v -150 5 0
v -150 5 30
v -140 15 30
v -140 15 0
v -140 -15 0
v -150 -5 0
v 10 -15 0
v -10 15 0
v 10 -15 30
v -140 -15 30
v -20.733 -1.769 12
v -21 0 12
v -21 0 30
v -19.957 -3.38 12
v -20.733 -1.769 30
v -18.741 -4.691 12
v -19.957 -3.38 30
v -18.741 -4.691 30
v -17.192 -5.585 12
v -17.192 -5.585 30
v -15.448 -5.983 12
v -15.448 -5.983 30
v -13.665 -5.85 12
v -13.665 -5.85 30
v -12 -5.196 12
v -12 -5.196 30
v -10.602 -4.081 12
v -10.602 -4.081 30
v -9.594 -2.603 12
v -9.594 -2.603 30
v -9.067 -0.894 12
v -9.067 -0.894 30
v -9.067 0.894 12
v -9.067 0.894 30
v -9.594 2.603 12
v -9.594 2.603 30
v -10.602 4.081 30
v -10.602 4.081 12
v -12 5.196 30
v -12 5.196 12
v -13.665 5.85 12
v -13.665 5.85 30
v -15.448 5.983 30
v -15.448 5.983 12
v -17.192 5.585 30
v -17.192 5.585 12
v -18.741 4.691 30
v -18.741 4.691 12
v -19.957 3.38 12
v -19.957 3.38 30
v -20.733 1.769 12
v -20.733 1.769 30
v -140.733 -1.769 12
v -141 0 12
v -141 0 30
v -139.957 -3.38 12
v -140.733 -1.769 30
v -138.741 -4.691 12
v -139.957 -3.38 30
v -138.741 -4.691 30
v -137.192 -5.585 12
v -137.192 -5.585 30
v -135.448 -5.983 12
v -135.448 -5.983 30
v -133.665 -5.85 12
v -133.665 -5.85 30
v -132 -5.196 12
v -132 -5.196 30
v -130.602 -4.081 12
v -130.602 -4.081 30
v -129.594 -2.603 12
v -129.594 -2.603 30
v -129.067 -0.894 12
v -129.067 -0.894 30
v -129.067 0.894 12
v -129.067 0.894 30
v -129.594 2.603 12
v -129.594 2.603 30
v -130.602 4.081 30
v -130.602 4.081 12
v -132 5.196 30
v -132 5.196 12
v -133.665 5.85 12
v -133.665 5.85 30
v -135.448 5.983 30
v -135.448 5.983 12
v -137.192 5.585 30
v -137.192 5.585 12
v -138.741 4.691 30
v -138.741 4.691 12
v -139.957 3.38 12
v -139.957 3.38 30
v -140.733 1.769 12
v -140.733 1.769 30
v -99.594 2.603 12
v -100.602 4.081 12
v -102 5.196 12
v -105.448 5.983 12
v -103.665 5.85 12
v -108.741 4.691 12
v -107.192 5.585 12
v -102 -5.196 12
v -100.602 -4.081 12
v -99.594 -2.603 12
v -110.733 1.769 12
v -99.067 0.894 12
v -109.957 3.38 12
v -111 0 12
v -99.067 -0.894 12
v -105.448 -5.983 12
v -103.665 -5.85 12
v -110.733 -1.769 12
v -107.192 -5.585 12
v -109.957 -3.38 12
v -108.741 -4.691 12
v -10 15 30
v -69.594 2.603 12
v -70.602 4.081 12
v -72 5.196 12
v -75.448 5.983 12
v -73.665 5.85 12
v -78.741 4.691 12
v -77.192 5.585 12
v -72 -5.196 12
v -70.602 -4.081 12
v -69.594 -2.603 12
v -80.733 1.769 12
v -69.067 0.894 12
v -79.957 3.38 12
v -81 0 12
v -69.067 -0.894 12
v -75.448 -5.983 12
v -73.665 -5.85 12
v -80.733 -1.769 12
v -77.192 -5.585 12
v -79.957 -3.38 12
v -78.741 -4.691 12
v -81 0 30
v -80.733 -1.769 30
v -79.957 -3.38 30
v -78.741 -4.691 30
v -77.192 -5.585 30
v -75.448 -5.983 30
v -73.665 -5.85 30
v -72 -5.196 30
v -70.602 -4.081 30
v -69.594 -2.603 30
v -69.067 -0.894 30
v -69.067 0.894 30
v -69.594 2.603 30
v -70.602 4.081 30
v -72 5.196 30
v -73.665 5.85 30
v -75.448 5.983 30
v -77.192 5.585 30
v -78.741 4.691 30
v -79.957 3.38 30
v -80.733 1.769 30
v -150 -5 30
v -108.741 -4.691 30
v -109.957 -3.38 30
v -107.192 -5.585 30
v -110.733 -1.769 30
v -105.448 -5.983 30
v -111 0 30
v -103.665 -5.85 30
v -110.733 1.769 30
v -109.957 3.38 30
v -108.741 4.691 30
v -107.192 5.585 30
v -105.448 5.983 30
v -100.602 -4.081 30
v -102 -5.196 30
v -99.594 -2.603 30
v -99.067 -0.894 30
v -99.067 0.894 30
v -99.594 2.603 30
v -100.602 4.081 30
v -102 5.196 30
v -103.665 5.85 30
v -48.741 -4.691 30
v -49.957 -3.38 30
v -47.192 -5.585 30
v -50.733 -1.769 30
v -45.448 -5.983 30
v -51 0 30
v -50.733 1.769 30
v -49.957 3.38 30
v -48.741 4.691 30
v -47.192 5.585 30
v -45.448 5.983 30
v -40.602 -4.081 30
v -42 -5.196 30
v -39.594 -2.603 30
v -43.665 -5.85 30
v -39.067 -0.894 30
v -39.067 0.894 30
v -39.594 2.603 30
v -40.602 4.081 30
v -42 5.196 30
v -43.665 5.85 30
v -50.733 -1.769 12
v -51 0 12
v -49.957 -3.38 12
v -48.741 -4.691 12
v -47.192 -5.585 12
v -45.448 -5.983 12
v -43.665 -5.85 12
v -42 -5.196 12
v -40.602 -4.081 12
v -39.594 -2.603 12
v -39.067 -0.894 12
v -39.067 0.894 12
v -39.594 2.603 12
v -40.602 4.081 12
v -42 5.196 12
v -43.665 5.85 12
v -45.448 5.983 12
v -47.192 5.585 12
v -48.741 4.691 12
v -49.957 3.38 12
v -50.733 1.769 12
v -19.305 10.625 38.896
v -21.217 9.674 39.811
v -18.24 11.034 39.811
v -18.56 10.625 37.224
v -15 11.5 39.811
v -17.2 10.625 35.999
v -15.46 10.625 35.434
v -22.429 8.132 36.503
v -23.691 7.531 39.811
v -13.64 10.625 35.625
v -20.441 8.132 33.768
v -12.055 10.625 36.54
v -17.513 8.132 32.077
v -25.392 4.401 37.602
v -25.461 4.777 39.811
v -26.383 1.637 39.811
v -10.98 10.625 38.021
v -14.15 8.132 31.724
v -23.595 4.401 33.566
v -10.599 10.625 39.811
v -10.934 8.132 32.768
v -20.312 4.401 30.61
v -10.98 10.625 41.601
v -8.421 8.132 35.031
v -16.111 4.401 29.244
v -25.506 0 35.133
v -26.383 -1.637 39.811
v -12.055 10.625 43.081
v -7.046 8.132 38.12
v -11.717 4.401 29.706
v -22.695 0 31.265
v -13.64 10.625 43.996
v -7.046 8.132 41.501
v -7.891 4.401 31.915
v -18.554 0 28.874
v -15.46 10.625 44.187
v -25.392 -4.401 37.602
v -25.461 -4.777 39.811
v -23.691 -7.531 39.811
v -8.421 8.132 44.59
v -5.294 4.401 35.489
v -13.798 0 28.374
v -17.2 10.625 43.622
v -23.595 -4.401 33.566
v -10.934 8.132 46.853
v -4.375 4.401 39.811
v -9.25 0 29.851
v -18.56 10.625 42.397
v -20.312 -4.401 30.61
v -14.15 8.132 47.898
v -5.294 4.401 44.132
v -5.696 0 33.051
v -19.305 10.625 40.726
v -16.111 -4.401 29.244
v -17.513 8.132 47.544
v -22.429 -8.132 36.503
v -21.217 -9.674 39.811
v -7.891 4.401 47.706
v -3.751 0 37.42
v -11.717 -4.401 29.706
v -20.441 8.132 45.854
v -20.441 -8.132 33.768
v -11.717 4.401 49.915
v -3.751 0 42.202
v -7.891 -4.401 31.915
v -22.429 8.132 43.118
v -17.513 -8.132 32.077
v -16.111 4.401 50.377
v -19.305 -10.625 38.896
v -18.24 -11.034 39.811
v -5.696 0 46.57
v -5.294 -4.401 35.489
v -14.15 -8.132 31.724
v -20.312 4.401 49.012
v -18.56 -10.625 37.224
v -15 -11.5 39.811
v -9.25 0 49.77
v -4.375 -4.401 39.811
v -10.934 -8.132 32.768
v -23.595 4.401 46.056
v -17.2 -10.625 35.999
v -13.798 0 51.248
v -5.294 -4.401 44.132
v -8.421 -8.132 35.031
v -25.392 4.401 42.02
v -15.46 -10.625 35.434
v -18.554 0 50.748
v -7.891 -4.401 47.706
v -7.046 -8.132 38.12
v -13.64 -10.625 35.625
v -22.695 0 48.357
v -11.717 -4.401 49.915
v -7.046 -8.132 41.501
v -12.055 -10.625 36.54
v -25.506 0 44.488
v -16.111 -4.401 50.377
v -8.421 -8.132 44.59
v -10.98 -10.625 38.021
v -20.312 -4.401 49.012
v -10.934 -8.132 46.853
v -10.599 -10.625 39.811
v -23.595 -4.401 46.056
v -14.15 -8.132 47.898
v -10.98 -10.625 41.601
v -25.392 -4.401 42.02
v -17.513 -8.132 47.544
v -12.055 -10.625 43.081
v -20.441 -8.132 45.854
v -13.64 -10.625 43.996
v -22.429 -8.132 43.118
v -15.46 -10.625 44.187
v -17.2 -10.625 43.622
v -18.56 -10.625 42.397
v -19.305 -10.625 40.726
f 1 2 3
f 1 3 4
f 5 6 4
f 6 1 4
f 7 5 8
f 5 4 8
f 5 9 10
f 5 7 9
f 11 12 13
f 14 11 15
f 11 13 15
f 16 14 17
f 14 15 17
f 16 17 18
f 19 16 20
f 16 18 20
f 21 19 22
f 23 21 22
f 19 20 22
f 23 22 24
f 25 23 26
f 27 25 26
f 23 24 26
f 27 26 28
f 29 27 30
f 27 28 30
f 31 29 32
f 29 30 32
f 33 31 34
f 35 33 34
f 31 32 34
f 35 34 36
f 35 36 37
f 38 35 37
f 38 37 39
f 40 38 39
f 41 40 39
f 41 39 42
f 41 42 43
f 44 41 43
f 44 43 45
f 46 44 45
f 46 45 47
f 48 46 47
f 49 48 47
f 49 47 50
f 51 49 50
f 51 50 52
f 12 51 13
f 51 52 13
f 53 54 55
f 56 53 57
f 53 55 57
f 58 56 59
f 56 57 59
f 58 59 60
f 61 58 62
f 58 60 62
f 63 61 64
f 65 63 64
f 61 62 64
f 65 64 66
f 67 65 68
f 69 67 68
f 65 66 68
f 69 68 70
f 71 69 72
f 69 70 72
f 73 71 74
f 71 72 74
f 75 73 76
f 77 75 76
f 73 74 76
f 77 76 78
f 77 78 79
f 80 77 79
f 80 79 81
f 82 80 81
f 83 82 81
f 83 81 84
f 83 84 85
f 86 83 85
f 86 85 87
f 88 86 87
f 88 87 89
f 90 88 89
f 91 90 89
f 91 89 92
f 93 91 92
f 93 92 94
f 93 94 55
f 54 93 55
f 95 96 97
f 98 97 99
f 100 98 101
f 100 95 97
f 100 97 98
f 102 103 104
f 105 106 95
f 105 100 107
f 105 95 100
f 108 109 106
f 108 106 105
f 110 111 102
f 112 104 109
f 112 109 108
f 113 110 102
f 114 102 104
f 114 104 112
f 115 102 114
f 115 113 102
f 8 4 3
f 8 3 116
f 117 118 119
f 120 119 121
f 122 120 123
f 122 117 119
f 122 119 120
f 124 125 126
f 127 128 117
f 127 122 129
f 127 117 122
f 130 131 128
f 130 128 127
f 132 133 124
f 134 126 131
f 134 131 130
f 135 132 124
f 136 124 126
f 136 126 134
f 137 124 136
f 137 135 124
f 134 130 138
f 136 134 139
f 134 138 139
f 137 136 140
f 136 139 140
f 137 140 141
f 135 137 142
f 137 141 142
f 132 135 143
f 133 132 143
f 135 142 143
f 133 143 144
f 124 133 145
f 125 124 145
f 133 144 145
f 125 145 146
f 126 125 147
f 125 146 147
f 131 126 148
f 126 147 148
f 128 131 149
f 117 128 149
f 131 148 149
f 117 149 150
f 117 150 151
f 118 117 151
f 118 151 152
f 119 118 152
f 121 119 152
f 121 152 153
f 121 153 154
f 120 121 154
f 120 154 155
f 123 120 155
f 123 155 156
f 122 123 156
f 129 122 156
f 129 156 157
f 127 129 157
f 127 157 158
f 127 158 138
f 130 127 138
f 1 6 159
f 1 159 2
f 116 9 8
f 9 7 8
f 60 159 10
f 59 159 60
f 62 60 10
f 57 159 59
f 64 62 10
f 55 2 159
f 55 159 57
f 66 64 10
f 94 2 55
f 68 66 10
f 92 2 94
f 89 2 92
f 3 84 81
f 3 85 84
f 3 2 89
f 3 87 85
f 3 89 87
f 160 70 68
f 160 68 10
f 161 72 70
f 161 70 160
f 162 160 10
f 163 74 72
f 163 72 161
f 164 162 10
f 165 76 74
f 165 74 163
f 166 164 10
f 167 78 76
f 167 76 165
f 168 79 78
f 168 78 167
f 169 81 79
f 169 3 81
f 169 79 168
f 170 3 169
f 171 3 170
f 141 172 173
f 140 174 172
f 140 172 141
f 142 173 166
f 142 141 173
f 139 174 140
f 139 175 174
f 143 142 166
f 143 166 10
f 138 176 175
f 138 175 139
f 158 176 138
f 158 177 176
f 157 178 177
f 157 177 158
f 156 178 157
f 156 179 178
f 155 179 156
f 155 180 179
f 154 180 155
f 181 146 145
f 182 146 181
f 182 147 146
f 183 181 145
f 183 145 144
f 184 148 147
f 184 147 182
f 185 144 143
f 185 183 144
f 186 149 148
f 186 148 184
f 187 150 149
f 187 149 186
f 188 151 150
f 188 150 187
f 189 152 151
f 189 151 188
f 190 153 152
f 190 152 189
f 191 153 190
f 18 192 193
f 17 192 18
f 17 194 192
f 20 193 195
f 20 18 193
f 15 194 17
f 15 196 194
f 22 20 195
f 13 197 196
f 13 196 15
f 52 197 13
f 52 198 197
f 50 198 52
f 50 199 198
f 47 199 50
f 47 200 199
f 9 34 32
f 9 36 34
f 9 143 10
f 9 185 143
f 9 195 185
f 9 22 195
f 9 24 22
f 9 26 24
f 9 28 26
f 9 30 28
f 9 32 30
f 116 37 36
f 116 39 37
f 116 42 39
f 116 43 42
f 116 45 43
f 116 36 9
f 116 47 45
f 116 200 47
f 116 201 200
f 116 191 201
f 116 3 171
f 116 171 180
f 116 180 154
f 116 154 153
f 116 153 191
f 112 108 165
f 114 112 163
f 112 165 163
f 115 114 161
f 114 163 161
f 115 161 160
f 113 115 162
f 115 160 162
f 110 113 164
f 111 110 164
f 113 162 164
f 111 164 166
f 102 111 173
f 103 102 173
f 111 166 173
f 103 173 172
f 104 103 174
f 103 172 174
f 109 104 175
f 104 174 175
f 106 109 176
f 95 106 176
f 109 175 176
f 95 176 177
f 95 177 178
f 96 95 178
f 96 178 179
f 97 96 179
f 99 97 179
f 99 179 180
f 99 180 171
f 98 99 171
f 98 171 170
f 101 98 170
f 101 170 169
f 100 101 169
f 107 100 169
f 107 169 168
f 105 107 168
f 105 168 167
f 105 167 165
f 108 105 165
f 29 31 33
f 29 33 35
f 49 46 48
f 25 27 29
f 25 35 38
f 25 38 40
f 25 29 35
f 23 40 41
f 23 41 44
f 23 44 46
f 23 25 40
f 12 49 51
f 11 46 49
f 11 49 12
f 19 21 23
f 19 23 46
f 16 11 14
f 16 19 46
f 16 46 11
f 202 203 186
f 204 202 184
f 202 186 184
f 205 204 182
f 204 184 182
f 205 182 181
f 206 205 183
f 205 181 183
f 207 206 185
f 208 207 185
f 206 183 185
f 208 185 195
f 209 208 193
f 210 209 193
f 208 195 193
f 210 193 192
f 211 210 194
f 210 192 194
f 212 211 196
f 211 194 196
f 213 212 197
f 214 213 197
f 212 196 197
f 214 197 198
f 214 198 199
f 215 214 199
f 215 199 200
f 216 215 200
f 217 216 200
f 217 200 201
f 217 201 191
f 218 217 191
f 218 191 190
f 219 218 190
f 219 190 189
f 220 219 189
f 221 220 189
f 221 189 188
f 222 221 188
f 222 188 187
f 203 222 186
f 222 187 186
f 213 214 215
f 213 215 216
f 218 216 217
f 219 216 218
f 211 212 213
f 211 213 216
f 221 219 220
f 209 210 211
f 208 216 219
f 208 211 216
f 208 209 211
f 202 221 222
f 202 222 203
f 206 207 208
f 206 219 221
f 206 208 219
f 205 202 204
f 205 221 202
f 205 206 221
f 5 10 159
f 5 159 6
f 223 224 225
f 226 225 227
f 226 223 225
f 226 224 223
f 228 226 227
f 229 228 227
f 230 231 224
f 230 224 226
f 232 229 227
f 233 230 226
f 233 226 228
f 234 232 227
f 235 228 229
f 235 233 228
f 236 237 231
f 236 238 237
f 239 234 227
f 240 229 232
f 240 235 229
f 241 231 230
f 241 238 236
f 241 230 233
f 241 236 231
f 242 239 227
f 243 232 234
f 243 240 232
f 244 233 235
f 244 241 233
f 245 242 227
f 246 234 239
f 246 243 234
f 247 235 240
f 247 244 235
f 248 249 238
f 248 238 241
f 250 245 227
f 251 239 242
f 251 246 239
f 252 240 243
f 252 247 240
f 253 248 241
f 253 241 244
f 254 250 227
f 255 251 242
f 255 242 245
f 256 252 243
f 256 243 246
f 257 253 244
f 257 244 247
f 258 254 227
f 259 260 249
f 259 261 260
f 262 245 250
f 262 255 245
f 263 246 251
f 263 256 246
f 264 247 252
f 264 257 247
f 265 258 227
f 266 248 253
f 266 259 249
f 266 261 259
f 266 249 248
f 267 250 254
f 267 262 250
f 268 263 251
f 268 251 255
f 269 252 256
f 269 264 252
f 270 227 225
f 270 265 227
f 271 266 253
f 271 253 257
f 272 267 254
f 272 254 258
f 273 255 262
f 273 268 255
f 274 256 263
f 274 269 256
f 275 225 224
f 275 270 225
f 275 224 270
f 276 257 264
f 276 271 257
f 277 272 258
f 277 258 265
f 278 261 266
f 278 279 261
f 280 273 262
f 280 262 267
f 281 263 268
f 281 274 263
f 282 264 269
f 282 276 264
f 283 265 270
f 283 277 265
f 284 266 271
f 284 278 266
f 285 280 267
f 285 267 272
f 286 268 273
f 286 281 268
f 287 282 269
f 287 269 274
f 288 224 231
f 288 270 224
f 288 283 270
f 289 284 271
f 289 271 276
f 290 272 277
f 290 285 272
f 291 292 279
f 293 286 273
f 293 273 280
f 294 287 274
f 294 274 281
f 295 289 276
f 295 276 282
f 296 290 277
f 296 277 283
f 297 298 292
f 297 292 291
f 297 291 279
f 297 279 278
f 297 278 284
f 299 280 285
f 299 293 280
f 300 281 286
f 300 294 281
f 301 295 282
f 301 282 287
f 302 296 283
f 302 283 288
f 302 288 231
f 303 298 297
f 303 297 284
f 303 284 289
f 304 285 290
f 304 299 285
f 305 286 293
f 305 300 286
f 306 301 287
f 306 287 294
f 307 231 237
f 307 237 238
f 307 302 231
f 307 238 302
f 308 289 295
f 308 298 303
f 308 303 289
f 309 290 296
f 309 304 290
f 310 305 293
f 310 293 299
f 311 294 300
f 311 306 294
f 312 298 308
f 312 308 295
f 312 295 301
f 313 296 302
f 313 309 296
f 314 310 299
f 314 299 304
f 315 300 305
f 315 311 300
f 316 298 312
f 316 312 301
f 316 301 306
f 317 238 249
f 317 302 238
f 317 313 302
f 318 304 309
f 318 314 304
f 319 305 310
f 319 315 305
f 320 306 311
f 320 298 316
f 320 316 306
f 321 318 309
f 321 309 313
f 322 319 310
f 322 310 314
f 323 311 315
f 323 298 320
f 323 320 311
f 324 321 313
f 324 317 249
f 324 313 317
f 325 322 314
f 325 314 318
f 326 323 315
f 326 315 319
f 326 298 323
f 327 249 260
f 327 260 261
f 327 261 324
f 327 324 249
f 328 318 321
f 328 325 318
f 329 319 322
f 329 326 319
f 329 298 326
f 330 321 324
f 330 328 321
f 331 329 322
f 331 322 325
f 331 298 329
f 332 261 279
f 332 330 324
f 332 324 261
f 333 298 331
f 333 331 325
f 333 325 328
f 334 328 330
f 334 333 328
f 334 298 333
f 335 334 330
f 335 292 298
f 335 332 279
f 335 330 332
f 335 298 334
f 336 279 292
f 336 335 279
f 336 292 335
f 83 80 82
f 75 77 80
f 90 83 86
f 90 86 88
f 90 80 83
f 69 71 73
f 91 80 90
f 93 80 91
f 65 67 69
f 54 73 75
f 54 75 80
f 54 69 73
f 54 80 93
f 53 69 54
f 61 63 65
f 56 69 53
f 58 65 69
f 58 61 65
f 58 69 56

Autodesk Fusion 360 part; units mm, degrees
sketch "Sketch1" plane through (0, 0, 0) normal (0, 0, 1) x (1, 0, 0) in component "Component"
  line L0 (150, -15) -> (-150, -15)
  line L1 (-150, -15) -> (-150, 15)
  line L2 (-150, 15) -> (150, 15)
  line L3 (150, 15) -> (150, -15)
  line L4 (150, -15) -> (-150, 15) construction
  line L5 (-150, -15) -> (150, 15) construction
  dimension "d1" = 300
  dimension "d2" = 30
extrude "Extrude1" add sketch "Sketch1" along normal blind 30 makes body 1 in component "Component"
sketch "Sketch2" plane through (0, 0, 30) normal (0, 0, 1) x (-1, 0, 0) in component "Component"
  line L0 (-150, -15) -> (150, -15)
  line L1 (150, -15) -> (150, 15)
  line L2 (150, 15) -> (-150, 15)
  line L3 (-150, 15) -> (-150, -15)
  line L4 (-150, 0) -> (-135, 0) construction
  circle A0 centre (-135, 0) radius 6
  circle A1 centre (-105, 0) radius 6
  circle A2 centre (-75, 0) radius 6
  circle A3 centre (-45, 0) radius 6
  circle A4 centre (-15, 0) radius 6
  circle A5 centre (15, 0) radius 6
  circle A6 centre (45, 0) radius 6
  circle A7 centre (75, 0) radius 6
  circle A8 centre (105, 0) radius 6
  circle A9 centre (135, 0) radius 6
  dimension "d5" = 15
  dimension "d6" = 12
  dimension "d9" = 30
  dimension "d10" = 0
extrude "Extrude2" cut sketch "Sketch2" against normal blind 18 contours A0 | A1 | A2 | A3 | A4 | A5 | A6 | A7 | A8 | A9 bodies 1 in component "Component"
chamfer "Chamfer1" distance 10 distance2 10 4 edges at (150, 15, 15) (-150, 15, 15) (-150, -15, 15) (150, -15, 15) measured on face at (150, 5, 10) measured on face at (-50, 15, 10) measured on face at (-150, -5, 10) measured on face at (50, -15, 10) on bodies 1 in component "Component"
sketch "Sketch3" plane through (0, 0, 0) normal (0, 0, -1) x (1, 0, 0) in component "Component"
  line L0 (150, 5) -> (140, 15)
  line L1 (140, 15) -> (-140, 15)
  line L2 (-140, 15) -> (-150, 5)
  line L3 (-150, 5) -> (-150, -5)
  line L4 (-150, -5) -> (-140, -15)
  line L5 (-140, -15) -> (140, -15)
  line L6 (140, -15) -> (150, -5)
  line L7 (150, -5) -> (150, 5)
  line L8 (0, 0) -> (0, 15) construction
  line L9 (0, 15) -> (10, 15) construction
  line L10 (10, 15) -> (-10, -15)
  dimension "d15" = 10
extrude "Extrude3" cut sketch "Sketch3" against normal blind 75 contours L0 L1 L5 L6 L7 L10 bodies 1 in component "Component"
sphere "SpherePrimitive1" add diameter 23 placed x (-1, 0, 0) y (0, -1, 0) z (0, 0, 1) at (-75, 0, 30) separate body makes body 2 in component "Component'"
sketch "Esquisse4" plane through (0, 0, 0) normal (0, 1, 0) x (1, 0, 0) in component "Component"
  line L0 (-9, -30) -> (-21, -30) construction
  line L1 (-15, -30) -> (-15, -51.3107) construction
  circle A0 centre (-15, -39.8107) radius 11.5 construction
  dimension "d21" = 23
component "Component" placed x (1, 0, 0) y (0, 1, 0) z (0, 0, 1) at (0, 0, 0)
component "Component'" placed x (1, 0, 0) y (0, 0, 1) z (0, -1, 0) at (60, 30, 39.8107)
equation "d11 = -( 30 mm - 12 mm )"
